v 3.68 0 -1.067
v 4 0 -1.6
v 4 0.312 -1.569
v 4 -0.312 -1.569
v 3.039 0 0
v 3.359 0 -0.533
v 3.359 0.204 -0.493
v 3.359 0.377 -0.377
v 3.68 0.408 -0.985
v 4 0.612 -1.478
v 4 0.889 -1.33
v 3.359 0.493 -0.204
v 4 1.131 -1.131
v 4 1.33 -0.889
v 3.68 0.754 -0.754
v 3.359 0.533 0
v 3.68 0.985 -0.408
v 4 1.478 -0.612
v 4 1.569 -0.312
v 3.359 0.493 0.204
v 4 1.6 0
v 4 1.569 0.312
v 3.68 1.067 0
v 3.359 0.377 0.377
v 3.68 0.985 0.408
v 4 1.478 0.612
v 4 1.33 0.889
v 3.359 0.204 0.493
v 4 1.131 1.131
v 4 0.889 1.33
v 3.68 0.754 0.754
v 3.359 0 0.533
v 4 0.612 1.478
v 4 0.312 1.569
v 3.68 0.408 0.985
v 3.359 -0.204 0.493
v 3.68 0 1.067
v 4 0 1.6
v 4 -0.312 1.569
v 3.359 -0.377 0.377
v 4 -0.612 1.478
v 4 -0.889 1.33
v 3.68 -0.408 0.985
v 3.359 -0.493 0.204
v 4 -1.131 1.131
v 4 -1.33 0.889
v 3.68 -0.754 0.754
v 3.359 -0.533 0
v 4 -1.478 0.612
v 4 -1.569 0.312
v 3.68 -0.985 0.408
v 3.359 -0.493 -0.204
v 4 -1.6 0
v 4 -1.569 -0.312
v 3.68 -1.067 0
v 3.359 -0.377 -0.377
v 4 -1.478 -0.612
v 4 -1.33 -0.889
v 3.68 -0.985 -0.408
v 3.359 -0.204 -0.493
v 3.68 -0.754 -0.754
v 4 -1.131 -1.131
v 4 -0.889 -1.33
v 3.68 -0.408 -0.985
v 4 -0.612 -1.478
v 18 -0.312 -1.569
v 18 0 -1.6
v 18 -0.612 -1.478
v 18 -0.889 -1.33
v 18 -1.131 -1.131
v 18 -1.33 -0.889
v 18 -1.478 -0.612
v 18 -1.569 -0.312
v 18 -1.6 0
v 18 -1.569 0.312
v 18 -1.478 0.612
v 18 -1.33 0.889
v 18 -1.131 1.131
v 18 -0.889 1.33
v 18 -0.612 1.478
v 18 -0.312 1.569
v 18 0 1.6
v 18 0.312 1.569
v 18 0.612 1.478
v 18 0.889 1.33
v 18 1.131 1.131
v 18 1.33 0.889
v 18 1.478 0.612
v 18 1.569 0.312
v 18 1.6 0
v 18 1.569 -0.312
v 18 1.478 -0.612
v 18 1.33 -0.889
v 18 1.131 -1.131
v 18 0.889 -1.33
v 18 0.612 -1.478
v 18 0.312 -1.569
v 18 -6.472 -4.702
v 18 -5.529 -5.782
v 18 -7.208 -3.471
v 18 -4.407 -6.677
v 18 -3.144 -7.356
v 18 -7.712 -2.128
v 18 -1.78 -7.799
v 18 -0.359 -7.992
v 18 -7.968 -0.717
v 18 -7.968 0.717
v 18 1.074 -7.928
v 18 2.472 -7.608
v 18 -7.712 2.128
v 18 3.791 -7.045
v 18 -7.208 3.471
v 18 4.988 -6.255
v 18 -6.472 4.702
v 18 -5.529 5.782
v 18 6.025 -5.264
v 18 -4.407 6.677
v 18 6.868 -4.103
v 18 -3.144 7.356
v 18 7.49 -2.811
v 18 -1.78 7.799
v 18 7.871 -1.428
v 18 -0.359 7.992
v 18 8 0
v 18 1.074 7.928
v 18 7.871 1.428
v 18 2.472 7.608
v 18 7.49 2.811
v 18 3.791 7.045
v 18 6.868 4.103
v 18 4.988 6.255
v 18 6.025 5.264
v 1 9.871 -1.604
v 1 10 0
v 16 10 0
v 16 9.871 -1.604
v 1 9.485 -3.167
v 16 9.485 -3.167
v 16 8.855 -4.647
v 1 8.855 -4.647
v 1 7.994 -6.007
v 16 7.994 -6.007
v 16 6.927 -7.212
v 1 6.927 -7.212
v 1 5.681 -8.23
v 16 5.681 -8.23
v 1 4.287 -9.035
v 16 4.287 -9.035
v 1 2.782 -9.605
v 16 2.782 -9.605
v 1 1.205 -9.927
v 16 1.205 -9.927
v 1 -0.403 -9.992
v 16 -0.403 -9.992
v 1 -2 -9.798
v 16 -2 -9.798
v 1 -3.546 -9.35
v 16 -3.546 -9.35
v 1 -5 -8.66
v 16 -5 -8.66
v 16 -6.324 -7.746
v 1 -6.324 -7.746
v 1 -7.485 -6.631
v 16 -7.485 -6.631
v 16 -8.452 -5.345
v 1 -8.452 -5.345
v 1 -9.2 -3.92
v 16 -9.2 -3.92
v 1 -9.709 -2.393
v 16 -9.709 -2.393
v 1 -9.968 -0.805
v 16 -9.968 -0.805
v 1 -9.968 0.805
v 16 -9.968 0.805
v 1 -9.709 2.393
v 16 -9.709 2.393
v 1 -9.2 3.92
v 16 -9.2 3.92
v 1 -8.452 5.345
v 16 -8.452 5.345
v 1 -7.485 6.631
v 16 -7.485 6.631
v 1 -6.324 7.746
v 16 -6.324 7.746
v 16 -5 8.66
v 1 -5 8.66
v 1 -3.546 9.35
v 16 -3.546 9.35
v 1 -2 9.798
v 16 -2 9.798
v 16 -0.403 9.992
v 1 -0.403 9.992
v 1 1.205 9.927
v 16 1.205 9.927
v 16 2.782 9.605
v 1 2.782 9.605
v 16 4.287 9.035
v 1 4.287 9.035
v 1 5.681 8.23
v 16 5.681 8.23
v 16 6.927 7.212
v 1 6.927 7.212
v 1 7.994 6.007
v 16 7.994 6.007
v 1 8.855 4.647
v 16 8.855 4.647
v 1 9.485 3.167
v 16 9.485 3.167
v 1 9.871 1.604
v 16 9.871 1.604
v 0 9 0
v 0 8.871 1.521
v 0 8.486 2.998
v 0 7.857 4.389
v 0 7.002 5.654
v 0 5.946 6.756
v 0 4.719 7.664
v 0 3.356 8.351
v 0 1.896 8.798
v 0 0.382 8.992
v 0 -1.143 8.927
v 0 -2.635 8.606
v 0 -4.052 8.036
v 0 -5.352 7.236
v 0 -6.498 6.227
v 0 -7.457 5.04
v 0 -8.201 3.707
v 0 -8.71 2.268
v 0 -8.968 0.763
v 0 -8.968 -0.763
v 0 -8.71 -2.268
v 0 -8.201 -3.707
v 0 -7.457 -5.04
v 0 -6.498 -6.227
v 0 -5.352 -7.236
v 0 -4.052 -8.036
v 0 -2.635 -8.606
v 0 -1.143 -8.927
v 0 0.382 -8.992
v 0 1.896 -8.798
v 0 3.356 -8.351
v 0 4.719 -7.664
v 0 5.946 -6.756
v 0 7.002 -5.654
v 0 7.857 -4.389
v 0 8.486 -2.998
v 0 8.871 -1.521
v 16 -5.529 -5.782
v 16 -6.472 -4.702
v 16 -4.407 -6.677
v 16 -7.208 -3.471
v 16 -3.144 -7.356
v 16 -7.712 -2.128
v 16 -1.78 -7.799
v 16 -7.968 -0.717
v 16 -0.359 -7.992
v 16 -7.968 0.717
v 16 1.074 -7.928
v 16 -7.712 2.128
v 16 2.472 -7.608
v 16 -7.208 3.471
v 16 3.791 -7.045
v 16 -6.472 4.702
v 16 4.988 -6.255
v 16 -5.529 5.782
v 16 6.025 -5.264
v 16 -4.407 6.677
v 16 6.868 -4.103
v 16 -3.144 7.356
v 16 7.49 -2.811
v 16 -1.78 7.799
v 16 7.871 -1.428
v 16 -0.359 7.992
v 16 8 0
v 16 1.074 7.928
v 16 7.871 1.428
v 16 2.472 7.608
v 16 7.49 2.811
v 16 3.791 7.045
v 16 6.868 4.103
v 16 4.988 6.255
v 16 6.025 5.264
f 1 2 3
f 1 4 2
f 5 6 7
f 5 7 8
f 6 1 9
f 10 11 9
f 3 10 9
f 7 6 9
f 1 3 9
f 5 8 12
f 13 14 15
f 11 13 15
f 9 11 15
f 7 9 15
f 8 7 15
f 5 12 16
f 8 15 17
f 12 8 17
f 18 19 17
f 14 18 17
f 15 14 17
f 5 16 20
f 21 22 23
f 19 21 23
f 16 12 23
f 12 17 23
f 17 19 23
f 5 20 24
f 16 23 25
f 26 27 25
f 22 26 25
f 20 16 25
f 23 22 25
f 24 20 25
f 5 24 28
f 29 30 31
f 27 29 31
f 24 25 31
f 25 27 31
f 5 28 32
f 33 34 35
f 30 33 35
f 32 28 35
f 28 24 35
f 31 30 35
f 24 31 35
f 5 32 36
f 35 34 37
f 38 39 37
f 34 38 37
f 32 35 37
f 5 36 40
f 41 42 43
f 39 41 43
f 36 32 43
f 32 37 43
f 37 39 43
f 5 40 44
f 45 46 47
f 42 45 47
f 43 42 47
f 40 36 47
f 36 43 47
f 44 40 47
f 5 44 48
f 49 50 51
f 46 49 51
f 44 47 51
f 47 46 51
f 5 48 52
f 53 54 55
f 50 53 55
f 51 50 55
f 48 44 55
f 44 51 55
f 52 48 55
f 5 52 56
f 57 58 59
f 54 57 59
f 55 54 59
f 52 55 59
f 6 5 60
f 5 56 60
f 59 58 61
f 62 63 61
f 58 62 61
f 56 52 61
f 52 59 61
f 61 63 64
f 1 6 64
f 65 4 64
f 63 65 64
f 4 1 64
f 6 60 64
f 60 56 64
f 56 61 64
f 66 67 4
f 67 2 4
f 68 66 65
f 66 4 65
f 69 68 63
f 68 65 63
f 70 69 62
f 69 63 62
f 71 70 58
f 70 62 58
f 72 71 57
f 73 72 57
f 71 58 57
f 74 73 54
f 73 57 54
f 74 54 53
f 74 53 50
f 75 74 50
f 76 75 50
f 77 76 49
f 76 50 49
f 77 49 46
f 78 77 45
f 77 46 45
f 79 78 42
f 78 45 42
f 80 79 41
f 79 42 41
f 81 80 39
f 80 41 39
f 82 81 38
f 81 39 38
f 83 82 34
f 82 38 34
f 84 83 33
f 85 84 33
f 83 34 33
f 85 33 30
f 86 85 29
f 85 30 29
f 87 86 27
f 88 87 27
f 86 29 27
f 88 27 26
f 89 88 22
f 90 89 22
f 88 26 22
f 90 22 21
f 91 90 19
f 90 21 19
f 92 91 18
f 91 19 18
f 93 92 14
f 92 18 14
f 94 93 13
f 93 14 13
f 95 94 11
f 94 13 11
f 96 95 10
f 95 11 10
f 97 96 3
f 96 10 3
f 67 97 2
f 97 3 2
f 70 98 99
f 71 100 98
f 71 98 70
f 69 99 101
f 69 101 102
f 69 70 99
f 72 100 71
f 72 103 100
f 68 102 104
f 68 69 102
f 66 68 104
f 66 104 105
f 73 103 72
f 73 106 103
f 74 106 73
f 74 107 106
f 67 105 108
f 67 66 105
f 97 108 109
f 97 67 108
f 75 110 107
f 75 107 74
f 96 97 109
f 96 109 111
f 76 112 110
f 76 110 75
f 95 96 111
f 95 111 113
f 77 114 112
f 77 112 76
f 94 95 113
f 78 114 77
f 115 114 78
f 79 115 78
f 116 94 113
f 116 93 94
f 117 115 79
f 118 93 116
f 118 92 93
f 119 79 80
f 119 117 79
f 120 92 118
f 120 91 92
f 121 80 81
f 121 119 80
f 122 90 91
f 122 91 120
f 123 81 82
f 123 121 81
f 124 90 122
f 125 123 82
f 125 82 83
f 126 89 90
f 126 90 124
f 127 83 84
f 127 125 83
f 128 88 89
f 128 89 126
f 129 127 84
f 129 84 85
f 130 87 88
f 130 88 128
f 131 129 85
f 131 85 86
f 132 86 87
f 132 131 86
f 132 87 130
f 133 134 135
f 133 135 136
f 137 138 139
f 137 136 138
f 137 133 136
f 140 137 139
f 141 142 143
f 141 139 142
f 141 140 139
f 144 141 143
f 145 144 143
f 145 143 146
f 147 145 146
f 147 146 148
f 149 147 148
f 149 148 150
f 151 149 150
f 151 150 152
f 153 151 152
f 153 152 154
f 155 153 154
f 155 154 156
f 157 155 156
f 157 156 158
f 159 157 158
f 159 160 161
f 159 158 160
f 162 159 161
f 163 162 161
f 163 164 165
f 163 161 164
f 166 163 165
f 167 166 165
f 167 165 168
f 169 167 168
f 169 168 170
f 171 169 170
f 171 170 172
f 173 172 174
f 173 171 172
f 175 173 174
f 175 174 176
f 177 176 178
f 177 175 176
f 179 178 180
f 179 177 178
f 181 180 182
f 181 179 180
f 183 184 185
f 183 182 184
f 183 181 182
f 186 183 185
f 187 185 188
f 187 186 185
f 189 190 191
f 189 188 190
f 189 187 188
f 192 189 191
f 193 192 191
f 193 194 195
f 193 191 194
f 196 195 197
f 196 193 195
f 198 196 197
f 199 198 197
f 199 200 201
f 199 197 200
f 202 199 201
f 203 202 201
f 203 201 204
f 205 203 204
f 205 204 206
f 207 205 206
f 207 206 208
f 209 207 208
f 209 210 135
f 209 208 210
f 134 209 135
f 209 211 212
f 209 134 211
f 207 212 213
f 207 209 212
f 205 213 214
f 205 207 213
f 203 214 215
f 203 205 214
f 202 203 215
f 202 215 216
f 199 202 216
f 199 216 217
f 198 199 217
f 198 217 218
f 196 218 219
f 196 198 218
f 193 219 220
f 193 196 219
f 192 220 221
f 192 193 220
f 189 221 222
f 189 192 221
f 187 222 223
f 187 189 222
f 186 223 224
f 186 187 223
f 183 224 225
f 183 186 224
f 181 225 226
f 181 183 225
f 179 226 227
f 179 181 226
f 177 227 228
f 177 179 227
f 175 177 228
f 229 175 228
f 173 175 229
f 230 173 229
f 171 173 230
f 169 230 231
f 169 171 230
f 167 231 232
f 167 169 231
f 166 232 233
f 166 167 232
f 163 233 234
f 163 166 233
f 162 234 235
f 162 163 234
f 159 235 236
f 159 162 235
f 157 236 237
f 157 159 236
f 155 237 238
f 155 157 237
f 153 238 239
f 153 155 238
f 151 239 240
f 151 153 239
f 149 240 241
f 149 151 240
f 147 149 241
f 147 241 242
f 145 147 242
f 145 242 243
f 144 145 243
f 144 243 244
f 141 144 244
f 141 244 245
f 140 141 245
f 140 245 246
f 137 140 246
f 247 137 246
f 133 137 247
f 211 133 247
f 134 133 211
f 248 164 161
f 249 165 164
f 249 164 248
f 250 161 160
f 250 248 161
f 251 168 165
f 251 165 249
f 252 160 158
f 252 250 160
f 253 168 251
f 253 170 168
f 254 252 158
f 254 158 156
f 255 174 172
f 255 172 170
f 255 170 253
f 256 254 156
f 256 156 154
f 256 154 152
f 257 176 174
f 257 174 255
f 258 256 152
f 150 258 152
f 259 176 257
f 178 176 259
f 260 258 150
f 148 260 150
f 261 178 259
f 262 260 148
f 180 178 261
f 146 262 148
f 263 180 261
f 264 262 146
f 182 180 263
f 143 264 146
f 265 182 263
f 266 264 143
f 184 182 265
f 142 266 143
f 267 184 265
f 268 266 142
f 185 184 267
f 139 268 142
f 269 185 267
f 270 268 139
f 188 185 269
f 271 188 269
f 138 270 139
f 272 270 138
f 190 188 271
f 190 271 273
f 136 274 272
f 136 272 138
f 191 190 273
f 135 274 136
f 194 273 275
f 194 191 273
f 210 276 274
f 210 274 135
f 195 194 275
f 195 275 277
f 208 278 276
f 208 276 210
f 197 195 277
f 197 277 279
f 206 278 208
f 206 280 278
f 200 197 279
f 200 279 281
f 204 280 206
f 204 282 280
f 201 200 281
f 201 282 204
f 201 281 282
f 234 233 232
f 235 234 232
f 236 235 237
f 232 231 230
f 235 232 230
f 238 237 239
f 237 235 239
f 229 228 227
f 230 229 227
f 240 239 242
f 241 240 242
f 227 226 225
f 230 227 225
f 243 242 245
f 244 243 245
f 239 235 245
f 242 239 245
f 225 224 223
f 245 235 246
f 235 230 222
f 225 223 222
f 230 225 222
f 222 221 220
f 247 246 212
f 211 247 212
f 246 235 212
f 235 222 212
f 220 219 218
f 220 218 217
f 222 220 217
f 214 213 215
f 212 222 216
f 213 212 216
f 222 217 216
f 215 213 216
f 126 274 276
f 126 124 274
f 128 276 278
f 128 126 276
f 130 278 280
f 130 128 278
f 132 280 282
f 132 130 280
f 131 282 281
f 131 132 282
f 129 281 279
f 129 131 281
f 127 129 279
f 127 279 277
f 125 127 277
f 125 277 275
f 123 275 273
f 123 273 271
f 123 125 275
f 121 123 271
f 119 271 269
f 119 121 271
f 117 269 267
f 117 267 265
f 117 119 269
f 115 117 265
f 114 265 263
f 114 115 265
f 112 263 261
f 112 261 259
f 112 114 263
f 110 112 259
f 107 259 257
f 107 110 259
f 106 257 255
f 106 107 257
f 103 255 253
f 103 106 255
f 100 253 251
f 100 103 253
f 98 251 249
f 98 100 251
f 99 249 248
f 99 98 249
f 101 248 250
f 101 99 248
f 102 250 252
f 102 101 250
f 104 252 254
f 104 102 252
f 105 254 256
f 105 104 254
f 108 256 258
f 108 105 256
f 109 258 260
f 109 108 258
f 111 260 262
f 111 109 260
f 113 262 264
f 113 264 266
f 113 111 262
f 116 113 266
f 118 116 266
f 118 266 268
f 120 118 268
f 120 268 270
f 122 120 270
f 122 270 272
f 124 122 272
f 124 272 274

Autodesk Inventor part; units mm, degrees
ref_plane "YZ Plane" through (0, 0, 0) normal (1, 0, 0) x (0, 1, 0)
ref_plane "XZ Plane" through (0, 0, 0) normal (0, 1, 0) x (-1, 0, 0)
ref_plane "XY Plane" through (0, 0, 0) normal (0, 0, 1) x (1, 0, 0)
sketch "Sketch1" plane through (0, 0, 0) normal (0, 0, 1) x (1, 0, 0)
  line L0 (0, 0) -> (18, 0)
  line L1 (18, 0) -> (18, 10)
  line L2 (18, 10) -> (0, 10)
  line L3 (0, 10) -> (0, 0)
  line L4 (18, 0) -> (16, 0)
  line L5 (16, 0) -> (16, 8)
  line L6 (16, 8) -> (18, 8)
  line L7 (18, 8) -> (18, 0)
  line L8 (16, 8) -> (16, 10)
  dimension "d0" = 18
  dimension "d1" = 10
  dimension "d2" = 2
  dimension "d3" = 8
revolve "Revolution1" add sketch "Sketch1" angle 360 about axis through (0, 0, 0) along (1, 0, 0) contours L3 L2 L8 L5 L0 | L5 L6 L1 L0
chamfer "Chamfer1" distance 1 angle 45 1 edges at (0, -10, 0)
sketch "Sketch2" plane through (18, 0, 0) normal (1, 0, 0) x (0, 0, -1)
  point P0 (0, 0)
  point P1 (0, 0)
hole "Hole1" at (18, 0, 0) direction (-1, 0, 0) diameter 3.2 depth 14 tip angle 118
thread "Thread1" size "M3.5x0.6" class "6H" standard "ANSI Metric M Profile" length 10.5
properties part number "üllő"
